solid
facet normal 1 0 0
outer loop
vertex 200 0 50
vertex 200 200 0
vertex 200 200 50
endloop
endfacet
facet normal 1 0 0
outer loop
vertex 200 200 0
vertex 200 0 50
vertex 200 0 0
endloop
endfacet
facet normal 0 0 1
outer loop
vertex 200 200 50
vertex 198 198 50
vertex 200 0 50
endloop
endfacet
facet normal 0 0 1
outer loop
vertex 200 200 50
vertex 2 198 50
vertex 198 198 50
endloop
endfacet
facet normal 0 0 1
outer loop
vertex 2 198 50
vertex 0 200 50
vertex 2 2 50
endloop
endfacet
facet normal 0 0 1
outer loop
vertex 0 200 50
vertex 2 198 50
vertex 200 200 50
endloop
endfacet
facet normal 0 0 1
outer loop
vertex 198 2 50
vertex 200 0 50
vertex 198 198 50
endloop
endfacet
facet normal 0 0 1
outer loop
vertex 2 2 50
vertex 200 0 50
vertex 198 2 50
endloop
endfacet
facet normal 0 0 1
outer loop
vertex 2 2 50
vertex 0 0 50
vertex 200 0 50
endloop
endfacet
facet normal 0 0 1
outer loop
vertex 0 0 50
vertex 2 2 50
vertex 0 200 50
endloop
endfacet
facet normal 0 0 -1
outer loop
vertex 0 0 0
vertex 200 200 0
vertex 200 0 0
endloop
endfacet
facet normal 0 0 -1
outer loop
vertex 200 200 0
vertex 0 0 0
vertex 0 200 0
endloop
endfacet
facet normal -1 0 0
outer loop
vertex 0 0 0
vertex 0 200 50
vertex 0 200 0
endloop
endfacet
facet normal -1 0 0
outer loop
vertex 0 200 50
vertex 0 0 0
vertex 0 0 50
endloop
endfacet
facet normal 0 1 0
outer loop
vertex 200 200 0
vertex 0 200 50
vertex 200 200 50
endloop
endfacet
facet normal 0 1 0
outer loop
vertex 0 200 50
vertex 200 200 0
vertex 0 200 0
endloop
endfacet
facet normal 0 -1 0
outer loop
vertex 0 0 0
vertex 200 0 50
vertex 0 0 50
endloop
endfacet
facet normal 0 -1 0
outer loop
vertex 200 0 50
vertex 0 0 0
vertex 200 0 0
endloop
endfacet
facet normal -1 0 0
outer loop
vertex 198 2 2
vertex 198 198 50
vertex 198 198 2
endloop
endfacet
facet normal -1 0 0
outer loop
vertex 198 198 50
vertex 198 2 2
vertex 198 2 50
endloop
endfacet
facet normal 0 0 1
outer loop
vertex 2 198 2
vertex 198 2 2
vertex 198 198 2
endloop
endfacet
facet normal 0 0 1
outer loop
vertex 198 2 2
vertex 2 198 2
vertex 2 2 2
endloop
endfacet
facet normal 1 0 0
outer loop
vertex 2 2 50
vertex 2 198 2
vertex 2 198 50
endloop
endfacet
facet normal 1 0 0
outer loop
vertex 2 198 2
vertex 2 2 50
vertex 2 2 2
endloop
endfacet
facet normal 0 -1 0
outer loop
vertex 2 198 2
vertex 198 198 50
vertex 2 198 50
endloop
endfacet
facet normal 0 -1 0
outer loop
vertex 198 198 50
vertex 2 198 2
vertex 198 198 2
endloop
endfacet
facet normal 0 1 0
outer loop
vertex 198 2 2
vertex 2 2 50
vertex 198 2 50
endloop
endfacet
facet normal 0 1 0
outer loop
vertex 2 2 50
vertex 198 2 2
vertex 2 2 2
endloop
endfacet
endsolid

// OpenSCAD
/*

    Storage box
    
    By Anton Augustsson
    
    
*/



module SortBox (widthUnit,lenghtUnit){


// ---------- Constant varables ----------
u=50;
height=u;
wallThickness=2;
    
width=widthUnit*u;
lenght=lenghtUnit*u;
    
inerWidth=(width-wallThickness*2);
inerLenght=(lenght-wallThickness*2);


// ---------- Code ---------- 
difference() {
cube(size = [
    width,
    lenght,
    height]);

translate([
    wallThickness,    // Centering
    wallThickness, 
    wallThickness
    ]) 
cube(size = [
    inerWidth,
    inerLenght,
    height]);
}}

// ---------- Example ---------- 
SortBox (4,4);
